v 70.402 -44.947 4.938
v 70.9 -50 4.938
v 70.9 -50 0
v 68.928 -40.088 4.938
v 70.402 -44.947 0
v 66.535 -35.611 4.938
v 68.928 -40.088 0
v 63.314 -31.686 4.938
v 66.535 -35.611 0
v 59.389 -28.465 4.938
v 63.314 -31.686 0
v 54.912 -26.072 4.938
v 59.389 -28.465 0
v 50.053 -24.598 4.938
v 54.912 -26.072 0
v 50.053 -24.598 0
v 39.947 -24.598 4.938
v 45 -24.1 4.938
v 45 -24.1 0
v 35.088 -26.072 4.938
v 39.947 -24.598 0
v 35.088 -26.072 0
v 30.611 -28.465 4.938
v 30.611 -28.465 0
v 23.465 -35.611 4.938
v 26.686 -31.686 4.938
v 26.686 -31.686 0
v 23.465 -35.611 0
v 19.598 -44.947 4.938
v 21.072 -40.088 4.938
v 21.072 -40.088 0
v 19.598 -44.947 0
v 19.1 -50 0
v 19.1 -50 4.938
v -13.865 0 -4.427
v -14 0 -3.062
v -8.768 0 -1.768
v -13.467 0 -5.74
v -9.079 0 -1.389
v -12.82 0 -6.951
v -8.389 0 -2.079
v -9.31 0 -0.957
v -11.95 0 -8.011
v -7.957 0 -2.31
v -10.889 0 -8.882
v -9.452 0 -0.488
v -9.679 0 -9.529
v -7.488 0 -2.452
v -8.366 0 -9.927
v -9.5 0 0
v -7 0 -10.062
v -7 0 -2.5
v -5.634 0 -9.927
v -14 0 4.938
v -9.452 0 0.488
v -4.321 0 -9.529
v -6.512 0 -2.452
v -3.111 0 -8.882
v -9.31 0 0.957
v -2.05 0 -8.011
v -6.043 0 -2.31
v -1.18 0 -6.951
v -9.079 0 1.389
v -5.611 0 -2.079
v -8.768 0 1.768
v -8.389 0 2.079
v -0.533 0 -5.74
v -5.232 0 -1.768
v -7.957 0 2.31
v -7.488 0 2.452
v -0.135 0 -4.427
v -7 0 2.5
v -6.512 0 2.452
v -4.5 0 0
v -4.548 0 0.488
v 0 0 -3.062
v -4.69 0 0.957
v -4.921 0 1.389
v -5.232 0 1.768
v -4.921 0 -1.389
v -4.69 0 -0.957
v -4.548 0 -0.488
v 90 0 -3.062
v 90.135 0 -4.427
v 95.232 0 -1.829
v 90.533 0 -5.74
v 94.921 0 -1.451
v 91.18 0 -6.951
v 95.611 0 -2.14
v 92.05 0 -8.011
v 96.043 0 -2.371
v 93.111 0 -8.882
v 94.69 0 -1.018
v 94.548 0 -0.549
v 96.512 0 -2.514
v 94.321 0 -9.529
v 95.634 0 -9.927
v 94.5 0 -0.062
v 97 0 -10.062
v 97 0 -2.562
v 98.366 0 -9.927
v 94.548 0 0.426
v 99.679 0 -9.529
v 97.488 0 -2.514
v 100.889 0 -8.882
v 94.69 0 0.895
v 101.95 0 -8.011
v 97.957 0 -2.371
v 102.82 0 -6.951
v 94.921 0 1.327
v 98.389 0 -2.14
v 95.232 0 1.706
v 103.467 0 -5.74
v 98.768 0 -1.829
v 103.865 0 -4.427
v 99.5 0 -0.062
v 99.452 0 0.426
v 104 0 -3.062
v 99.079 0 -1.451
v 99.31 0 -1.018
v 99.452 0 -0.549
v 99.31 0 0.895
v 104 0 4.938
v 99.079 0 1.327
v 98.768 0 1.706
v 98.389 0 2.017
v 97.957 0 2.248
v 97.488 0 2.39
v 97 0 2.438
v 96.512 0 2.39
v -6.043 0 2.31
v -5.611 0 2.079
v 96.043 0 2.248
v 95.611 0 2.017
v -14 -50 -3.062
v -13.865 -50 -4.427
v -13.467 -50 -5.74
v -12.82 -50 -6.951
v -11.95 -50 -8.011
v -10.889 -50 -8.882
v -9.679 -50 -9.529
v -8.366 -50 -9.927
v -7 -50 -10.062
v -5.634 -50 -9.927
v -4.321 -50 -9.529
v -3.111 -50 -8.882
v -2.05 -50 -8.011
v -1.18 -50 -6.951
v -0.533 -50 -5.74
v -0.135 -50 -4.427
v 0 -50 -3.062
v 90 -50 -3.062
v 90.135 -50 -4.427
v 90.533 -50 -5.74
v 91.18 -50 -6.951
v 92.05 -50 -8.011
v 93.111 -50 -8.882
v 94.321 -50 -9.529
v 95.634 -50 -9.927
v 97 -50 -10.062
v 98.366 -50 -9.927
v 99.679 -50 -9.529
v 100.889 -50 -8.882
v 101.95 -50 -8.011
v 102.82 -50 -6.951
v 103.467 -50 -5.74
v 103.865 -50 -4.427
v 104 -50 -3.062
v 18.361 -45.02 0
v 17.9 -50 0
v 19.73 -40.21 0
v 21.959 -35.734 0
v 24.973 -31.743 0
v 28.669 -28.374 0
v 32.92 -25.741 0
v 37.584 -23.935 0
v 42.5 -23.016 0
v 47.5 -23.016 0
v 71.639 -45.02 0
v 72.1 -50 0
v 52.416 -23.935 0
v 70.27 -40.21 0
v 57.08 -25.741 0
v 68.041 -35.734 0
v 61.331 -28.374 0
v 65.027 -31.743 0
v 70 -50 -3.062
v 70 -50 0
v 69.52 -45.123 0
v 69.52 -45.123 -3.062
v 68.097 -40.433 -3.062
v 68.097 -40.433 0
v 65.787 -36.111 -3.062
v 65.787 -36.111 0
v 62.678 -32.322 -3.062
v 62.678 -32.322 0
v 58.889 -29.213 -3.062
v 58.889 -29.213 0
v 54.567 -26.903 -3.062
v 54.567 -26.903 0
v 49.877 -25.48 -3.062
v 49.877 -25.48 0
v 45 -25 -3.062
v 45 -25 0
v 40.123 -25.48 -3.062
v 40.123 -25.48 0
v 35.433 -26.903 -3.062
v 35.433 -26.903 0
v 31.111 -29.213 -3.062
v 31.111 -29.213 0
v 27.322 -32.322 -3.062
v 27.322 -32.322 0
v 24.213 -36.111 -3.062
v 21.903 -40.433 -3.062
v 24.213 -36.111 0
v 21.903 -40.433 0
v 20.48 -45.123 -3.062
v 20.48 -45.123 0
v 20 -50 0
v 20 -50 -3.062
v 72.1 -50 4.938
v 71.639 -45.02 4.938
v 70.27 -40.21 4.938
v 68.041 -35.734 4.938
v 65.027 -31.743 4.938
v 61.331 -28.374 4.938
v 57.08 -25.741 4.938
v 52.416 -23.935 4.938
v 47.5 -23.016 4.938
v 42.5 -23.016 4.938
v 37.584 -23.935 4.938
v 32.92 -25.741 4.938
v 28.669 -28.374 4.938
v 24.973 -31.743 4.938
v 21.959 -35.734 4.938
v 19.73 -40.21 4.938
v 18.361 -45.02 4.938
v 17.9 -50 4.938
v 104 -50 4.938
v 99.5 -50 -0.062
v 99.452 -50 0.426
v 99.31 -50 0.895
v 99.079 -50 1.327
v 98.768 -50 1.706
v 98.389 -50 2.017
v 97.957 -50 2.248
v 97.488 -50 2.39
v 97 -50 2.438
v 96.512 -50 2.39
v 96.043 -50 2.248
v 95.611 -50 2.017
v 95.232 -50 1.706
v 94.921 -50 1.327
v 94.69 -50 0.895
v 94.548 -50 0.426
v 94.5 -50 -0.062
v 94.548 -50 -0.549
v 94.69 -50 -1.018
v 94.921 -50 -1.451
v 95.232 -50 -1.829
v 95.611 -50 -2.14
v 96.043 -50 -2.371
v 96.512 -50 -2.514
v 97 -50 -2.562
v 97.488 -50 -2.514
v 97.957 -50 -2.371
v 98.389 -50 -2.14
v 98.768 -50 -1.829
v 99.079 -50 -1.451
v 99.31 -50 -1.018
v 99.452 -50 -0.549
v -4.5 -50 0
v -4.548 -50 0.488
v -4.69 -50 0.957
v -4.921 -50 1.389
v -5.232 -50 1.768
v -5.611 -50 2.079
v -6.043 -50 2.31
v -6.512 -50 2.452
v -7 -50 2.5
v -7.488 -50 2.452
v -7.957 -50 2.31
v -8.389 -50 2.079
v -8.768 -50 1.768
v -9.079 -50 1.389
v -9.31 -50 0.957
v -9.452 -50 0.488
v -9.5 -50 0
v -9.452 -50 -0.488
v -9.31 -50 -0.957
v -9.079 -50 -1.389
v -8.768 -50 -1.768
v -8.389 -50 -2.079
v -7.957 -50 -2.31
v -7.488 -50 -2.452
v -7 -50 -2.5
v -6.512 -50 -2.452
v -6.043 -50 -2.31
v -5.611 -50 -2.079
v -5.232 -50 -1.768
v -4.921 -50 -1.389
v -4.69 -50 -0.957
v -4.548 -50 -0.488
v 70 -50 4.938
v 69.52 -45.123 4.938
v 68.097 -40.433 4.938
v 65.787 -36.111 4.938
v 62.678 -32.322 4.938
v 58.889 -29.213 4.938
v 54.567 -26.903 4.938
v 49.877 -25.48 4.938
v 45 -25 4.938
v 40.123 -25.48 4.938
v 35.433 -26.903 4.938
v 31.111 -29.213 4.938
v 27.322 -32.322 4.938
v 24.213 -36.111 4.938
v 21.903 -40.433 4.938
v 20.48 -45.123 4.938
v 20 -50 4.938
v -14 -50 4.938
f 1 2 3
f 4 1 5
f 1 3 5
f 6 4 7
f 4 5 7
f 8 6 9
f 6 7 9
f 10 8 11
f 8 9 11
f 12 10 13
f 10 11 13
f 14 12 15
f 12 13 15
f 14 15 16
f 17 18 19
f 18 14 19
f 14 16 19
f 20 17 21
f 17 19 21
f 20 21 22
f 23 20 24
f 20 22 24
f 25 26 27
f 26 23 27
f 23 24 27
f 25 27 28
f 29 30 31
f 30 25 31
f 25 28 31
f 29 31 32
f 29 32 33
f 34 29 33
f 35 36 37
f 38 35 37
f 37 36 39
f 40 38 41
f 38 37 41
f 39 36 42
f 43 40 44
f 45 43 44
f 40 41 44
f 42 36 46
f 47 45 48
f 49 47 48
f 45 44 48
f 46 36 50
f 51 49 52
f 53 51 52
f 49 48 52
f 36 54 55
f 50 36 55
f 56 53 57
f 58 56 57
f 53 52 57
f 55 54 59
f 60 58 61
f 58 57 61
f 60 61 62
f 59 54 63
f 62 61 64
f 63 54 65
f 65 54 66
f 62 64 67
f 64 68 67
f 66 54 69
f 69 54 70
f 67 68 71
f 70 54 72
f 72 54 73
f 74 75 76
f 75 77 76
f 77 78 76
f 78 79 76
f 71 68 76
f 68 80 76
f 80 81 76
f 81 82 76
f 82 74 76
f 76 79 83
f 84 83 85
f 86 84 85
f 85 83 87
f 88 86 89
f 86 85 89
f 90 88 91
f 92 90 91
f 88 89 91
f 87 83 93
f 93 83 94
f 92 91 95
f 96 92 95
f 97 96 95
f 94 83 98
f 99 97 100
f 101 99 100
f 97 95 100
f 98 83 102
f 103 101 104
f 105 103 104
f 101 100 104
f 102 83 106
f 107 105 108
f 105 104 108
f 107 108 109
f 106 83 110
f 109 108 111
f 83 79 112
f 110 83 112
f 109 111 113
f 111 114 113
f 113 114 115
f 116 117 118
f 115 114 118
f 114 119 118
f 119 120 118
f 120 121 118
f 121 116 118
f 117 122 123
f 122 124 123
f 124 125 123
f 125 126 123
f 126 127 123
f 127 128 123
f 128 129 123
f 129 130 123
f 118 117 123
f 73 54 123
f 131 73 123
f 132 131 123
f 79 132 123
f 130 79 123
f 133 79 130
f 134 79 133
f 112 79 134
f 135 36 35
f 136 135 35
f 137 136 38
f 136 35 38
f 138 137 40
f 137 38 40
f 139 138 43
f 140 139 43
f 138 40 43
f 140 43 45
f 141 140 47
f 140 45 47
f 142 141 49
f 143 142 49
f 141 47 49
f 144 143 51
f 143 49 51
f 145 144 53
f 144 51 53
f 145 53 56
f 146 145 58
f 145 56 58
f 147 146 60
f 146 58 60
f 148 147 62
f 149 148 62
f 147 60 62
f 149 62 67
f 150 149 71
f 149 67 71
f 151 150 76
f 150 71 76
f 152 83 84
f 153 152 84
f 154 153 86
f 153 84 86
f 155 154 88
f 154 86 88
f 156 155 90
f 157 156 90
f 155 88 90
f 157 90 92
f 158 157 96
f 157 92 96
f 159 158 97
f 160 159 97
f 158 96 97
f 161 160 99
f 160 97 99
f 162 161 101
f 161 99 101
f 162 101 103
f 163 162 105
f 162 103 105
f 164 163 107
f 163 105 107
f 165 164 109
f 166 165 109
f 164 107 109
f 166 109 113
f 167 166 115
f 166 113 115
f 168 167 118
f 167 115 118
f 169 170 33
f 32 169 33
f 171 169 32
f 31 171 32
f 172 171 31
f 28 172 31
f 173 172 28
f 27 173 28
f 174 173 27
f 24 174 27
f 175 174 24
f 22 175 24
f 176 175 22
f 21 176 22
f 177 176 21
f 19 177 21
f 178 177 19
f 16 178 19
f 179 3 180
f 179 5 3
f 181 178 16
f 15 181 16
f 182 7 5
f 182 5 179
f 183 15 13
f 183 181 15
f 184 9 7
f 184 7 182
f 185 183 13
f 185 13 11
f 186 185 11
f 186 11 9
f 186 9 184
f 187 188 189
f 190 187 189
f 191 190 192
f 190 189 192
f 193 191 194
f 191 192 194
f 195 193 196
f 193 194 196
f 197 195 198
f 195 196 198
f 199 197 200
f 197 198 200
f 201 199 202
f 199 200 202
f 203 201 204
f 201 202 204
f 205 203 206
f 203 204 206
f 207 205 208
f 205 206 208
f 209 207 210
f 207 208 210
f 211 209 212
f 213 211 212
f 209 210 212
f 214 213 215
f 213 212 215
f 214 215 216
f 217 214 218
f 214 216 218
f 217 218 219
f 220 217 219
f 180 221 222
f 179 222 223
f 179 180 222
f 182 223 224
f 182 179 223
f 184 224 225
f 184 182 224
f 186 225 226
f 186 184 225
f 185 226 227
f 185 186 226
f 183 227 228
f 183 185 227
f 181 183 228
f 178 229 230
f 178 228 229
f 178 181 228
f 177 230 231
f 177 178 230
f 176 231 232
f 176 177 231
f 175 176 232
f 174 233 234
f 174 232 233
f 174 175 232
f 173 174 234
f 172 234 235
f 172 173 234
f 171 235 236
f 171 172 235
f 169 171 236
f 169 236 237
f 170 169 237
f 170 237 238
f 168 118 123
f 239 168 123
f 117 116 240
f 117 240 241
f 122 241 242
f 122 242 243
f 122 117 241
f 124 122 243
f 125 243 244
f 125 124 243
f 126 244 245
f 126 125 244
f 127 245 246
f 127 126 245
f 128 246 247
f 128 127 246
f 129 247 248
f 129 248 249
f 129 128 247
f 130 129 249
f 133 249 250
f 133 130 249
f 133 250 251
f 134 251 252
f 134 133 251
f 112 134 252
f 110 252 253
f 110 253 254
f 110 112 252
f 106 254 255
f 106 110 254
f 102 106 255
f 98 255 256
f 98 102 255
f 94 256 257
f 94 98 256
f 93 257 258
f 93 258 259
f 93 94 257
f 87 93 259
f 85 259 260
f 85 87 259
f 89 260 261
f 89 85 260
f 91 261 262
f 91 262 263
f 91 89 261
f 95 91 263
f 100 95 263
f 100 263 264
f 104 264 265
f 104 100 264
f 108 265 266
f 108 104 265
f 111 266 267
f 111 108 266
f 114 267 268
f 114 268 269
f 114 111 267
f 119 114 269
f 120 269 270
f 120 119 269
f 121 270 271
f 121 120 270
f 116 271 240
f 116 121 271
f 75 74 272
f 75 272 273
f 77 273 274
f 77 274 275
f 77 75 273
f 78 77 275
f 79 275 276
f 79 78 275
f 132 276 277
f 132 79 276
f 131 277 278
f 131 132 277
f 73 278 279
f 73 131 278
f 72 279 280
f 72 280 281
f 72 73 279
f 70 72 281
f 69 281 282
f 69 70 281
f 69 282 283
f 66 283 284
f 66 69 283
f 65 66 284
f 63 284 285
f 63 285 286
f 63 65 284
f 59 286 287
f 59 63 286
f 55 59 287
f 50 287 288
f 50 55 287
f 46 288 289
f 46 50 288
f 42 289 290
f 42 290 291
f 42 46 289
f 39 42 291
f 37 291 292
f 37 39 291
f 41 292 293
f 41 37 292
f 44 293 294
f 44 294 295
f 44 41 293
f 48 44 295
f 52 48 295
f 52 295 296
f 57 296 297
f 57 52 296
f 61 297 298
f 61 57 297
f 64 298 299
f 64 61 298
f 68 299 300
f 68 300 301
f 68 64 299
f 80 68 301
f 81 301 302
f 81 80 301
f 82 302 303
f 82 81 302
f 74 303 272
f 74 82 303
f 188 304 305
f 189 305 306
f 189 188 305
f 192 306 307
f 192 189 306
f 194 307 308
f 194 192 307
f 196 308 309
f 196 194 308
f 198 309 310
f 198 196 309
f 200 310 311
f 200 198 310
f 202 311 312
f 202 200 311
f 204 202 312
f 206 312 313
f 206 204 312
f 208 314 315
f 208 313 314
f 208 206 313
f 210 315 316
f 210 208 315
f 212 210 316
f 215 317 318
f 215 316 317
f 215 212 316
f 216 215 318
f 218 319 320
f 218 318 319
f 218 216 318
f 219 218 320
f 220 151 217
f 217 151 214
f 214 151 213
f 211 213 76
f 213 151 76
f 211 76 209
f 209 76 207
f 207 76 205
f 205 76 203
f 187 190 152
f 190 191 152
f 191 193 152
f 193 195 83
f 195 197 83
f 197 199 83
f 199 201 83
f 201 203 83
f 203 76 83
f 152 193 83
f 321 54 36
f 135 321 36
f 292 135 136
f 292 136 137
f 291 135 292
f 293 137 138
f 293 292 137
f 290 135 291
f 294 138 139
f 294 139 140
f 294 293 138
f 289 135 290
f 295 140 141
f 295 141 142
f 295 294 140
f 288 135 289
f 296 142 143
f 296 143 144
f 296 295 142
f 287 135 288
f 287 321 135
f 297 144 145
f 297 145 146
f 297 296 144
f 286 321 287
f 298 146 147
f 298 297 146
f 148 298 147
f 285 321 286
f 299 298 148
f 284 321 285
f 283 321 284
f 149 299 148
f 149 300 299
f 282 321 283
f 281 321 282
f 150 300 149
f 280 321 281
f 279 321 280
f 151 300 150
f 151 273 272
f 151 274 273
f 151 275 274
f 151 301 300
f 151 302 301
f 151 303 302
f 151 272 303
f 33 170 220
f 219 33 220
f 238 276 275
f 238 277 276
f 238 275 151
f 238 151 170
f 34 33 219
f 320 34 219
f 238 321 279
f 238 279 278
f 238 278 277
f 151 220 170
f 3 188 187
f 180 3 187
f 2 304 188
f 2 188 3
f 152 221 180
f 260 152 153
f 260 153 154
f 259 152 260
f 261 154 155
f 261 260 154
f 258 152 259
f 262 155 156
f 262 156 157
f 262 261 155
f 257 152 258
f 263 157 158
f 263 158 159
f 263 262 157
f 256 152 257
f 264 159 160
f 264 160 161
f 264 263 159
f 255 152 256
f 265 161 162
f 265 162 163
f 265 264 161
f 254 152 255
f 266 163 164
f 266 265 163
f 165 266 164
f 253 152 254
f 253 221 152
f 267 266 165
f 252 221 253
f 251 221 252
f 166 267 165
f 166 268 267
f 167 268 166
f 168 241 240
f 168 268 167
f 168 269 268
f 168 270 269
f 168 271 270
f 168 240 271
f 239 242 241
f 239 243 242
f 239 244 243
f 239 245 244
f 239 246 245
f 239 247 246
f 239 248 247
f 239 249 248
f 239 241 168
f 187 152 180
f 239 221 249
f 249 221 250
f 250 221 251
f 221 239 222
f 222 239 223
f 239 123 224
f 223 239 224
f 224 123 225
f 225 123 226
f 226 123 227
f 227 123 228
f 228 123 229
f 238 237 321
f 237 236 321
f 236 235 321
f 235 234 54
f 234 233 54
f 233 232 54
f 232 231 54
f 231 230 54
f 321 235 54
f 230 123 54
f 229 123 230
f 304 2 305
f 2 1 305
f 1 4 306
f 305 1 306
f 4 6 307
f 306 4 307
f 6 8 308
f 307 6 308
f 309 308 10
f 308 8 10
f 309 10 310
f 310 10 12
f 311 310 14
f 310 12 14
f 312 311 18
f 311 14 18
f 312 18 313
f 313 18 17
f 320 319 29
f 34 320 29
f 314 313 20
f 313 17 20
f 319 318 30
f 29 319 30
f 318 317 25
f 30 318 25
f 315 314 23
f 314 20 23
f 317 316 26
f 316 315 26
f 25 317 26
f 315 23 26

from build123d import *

# Parameters (mm, degrees)
F0_R     = 2.5
F1_DEPTH = 50
F2_R     = 25
F3_DEPTH = 25
F4_DEPTH = 50
F5_DEPTH = 25
F6_R     = 27.1
F6_R_2   = 25.9
F7_DEPTH = 5
F8_DEPTH = 25


# Not quite as in the source:
# - a feature names something its author has since deleted; it is built from what else it names


with BuildPart() as f1:
    # F0 (on Front) → F1 (new body)
    with BuildSketch(Plane.XZ):
        Polygon((90, 4.9383143896), (0, 4.9383143896), (0, -0.0616856104), (0, -3.0616856104), (90, -3.0616856104), (90, -0.0616856104), align=None)
        with BuildLine():
            Line((0, -0.0616856104), (0, 4.9383143896))
            Line((0, 4.9383143896), (-14, 4.9383143896))
            Line((-14, 4.9383143896), (-14, -3.0616856104))
            ThreePointArc((-14, -3.0616856104), (-7, -10.0616856104), (0, -3.0616856104))
            Line((0, -3.0616856104), (0, -0.0616856104))
        make_face()
        with Locations((-7, 0)):
            Circle(F0_R, mode=Mode.SUBTRACT)
    extrude(amount=F1_DEPTH)

    # F2 (on Top) → F3 (cut)
    with BuildSketch(Plane.XY):
        with Locations((45, -50)):
            Circle(F2_R)
    extrude(amount=-F3_DEPTH, mode=Mode.SUBTRACT)

    # F0 (on Front) → F4 (join)
    with BuildSketch(Plane.XZ):
        Polygon((90, 4.9383143896), (0, 4.9383143896), (0, -0.0616856104), (0, -3.0616856104), (90, -3.0616856104), (90, -0.0616856104), align=None)
        with BuildLine():
            Line((0, -0.0616856104), (0, 4.9383143896))
            Line((0, 4.9383143896), (-14, 4.9383143896))
            Line((-14, 4.9383143896), (-14, -3.0616856104))
            ThreePointArc((-14, -3.0616856104), (-7, -10.0616856104), (0, -3.0616856104))
            Line((0, -3.0616856104), (0, -0.0616856104))
        make_face()
        with Locations((-7, 0)):
            Circle(F0_R, mode=Mode.SUBTRACT)
        with BuildLine():
            Line((104, 4.9383143896), (90, 4.9383143896))
            Line((90, 4.9383143896), (90, -0.0616856104))
            Line((90, -0.0616856104), (90, -3.0616856104))
            ThreePointArc((90, -3.0616856104), (97, -10.0616856104), (104, -3.0616856104))
            Line((104, -3.0616856104), (104, -0.0616856104))
            Line((104, -0.0616856104), (104, 4.9383143896))
        make_face()
        with Locations((97, -0.0616856104)):
            Circle(F0_R, mode=Mode.SUBTRACT)
    extrude(amount=F4_DEPTH)

    # F2 (on Top) → F5 (cut)
    with BuildSketch(Plane.XY):
        with Locations((45, -50)):
            Circle(F2_R)
    extrude(amount=-F5_DEPTH, mode=Mode.SUBTRACT)

    # F6 (on Top) → F7 (cut)
    with BuildSketch(Plane.XY):
        with Locations((45, -50)):
            Circle(F6_R)
        with Locations((45, -50)):
            Circle(F6_R_2, mode=Mode.SUBTRACT)
    extrude(amount=F7_DEPTH, mode=Mode.SUBTRACT)

    # F2 (on Top) → F8 (cut)
    with BuildSketch(Plane.XY):
        with Locations((45, -50)):
            Circle(F2_R)
    extrude(amount=F8_DEPTH, mode=Mode.SUBTRACT)


solid = f1.part
